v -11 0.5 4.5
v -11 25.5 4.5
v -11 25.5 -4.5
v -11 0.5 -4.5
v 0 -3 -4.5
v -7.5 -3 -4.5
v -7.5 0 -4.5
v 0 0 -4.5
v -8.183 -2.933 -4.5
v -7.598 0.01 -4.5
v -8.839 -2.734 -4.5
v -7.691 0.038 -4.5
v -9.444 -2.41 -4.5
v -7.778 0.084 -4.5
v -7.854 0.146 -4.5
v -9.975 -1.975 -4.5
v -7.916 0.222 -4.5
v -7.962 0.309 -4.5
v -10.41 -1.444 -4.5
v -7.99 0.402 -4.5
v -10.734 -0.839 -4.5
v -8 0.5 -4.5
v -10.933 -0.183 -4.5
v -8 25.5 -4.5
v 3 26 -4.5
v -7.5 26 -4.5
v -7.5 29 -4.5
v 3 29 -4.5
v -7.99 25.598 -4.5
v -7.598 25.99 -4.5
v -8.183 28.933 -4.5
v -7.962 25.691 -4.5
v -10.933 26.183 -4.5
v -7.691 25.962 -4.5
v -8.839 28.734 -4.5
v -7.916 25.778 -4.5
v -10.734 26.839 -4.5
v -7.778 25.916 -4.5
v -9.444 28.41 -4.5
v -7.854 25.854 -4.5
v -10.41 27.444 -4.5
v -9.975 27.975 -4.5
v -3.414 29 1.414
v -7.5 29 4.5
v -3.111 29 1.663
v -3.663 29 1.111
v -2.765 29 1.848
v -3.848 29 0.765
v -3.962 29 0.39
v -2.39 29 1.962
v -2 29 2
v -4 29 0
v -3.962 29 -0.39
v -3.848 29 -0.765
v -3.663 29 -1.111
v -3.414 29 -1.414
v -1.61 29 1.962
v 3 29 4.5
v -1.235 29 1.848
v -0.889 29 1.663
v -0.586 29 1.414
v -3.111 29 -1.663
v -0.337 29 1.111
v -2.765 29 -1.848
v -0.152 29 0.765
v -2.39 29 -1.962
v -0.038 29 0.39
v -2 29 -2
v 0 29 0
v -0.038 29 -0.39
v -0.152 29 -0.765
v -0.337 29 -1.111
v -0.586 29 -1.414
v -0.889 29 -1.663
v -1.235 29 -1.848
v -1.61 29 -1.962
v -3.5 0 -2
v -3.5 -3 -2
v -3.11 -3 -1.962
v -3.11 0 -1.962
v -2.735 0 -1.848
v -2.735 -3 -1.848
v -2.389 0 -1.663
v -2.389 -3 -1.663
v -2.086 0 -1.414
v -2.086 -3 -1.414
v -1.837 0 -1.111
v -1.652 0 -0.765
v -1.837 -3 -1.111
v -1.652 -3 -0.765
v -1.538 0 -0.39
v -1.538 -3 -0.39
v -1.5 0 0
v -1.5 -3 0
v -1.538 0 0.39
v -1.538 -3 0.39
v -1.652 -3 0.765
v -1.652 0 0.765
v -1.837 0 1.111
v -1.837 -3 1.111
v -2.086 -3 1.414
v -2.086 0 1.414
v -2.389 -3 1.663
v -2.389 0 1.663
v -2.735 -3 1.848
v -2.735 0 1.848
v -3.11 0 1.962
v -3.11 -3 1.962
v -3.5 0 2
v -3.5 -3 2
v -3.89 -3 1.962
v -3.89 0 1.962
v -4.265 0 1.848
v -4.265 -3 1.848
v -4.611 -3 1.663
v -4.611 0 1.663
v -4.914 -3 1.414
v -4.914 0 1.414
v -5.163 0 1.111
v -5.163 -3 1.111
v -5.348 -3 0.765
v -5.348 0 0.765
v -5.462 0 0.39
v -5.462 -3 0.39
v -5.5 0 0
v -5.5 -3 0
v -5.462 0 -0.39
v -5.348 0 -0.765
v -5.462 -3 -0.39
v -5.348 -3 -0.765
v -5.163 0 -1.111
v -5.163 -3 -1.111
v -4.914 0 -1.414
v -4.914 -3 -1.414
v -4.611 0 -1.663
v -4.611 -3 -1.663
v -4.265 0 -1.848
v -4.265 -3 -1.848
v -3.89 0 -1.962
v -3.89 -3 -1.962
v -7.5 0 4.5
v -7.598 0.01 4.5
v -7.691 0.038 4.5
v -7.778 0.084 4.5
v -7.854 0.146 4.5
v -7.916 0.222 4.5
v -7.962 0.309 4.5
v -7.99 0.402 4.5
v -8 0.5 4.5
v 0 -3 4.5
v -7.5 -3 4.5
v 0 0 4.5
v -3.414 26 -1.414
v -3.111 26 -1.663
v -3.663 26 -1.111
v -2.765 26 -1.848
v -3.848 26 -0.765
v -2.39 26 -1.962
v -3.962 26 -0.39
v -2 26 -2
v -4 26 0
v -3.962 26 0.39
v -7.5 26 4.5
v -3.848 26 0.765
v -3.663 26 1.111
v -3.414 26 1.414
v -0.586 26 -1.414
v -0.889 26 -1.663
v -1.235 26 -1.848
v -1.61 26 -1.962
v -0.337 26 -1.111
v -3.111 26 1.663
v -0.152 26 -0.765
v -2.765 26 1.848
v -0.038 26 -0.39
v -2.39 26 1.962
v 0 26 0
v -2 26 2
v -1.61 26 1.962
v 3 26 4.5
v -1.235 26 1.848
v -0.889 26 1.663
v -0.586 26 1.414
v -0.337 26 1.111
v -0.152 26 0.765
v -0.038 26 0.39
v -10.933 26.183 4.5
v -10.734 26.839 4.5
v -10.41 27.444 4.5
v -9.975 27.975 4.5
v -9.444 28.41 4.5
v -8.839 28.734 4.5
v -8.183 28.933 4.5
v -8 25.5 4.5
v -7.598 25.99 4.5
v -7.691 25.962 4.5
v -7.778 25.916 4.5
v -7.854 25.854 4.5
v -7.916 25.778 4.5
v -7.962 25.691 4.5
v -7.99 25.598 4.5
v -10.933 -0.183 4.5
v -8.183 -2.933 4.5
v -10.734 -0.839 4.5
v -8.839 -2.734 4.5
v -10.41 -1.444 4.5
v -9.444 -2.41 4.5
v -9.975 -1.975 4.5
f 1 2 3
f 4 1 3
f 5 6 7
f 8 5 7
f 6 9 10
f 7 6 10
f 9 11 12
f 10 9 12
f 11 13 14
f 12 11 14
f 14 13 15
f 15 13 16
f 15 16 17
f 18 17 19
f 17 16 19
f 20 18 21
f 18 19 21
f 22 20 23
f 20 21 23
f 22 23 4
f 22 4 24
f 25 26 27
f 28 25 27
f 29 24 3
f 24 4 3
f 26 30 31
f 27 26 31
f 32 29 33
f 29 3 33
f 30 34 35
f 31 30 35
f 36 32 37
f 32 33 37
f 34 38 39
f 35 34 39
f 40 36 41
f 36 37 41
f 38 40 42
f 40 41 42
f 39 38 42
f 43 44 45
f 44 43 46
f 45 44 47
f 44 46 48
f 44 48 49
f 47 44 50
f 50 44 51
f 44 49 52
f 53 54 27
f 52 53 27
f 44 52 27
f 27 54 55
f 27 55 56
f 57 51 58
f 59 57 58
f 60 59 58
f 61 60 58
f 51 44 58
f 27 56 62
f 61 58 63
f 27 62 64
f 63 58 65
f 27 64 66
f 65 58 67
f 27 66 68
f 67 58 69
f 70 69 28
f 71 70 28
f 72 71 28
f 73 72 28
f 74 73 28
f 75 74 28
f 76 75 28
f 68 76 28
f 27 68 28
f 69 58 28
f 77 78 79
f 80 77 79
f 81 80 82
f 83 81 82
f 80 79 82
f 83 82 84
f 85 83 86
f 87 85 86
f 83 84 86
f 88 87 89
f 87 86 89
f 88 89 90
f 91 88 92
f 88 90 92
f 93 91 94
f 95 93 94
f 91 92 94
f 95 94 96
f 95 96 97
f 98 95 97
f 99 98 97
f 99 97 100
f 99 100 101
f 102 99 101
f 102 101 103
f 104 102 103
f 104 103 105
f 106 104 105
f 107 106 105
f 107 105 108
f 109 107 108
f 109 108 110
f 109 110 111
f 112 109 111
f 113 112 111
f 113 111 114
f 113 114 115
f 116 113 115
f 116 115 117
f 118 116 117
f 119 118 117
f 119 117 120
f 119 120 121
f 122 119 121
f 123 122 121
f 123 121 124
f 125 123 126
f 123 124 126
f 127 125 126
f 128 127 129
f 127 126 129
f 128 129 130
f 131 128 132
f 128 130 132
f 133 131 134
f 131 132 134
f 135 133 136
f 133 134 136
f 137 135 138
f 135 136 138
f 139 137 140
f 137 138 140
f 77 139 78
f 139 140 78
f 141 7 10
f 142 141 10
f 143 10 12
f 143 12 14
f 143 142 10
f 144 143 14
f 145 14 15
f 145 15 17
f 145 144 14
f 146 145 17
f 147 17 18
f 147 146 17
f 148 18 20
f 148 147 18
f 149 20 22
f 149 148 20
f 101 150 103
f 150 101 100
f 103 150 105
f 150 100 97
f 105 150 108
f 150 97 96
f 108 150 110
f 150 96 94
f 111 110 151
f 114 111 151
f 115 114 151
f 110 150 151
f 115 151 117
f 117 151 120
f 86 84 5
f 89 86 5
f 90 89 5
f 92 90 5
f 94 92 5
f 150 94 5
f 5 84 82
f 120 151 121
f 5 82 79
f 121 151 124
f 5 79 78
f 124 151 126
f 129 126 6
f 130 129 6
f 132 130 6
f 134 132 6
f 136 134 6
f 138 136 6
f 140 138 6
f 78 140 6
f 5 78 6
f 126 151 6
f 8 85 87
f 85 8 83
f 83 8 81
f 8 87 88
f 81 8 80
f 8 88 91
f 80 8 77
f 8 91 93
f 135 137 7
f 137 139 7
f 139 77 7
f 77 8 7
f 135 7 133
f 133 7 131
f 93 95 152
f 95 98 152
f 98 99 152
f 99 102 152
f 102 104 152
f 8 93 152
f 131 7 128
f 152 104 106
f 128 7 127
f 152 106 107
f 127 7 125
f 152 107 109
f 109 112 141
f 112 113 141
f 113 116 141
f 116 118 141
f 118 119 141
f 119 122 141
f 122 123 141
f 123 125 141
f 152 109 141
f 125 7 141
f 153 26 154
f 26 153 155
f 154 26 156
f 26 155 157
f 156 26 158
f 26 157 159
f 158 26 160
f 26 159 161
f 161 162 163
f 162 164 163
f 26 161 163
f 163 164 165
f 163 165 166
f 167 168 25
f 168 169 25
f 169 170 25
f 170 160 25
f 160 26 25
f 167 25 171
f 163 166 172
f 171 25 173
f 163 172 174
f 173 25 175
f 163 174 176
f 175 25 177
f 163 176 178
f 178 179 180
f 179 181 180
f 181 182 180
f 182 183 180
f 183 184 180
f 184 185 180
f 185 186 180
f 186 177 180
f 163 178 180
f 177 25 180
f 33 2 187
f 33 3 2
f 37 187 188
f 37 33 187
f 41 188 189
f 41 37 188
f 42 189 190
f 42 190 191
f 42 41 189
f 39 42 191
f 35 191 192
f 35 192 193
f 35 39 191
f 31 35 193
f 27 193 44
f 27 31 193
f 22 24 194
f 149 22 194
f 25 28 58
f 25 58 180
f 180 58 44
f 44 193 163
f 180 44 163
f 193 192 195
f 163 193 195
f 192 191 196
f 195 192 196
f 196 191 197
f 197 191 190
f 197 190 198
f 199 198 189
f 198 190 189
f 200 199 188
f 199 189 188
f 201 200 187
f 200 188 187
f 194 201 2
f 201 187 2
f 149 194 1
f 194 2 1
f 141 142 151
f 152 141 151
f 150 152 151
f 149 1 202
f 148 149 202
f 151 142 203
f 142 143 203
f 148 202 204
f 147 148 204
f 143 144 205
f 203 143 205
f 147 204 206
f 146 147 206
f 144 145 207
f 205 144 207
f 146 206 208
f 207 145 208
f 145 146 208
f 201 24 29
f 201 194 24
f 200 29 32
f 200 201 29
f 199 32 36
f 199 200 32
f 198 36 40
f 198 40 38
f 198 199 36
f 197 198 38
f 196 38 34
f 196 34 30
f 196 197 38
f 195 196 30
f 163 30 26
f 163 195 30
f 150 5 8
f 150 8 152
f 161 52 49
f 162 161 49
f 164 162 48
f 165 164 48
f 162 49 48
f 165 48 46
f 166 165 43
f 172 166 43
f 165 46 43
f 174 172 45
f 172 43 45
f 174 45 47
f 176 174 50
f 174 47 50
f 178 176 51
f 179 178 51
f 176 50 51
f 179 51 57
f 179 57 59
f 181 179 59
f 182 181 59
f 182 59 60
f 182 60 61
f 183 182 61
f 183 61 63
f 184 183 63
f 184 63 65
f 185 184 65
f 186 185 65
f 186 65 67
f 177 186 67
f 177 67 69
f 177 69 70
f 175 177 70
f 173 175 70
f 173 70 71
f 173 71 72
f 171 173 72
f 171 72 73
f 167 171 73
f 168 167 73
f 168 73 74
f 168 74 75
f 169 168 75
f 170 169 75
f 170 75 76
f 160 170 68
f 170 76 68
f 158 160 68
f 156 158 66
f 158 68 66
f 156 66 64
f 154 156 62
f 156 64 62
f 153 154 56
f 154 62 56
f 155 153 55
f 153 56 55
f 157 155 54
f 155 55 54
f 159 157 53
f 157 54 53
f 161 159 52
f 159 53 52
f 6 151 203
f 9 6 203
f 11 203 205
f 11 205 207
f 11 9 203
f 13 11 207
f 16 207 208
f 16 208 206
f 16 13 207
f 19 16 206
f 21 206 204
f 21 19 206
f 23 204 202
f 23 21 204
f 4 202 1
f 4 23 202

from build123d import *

# Parameters (mm, degrees)
SKETCH2_W          = 9
SKETCH2_H          = 3
SKETCH7_R          = 2
CUT_EXTRUDE1_DEPTH = 10
SKETCH8_R          = 2
CUT_EXTRUDE2_DEPTH = 10


with BuildPart() as part:
    # Sweep1: sweep along a path in Sketch1
    with BuildLine(Plane.XY) as sweep1_path:
        Line((0, 0), (-7.5, 0))
        ThreePointArc((-7.5, 0), (-7.853553391, 0.146446609), (-8, 0.5))
        Line((-8, 0.5), (-8, 25.5))
        ThreePointArc((-8, 25.5), (-7.853553391, 25.853553391), (-7.5, 26))
        Line((-7.5, 26), (3, 26))
    # Sketch2 → Sweep1 (sweep)
    with BuildSketch(Plane(origin=(0, 0, 0), x_dir=(0, 0, -1), z_dir=(1, 0, 0))):
        with Locations((0, -1.5)):
            Rectangle(SKETCH2_W, SKETCH2_H)
    sweep(path=sweep1_path.line)

    # Sketch7 → Cut-Extrude1 (cut)
    with BuildSketch(Plane(origin=(0, 29, 0), x_dir=(1, 0, 0), z_dir=(0, 1, 0))):
        with Locations(Location((-2, 0, 0), (0, 0, 180))):
            Circle(SKETCH7_R)
    extrude(amount=-CUT_EXTRUDE1_DEPTH, mode=Mode.SUBTRACT)

    # Sketch8 → Cut-Extrude2 (cut)
    with BuildSketch(Plane(origin=(0, -3, 0), x_dir=(-1, 0, 0), z_dir=(0, -1, 0))):
        with Locations(Location((3.5, 0, 0), (0, 0, 90))):
            Circle(SKETCH8_R)
    extrude(amount=-CUT_EXTRUDE2_DEPTH, mode=Mode.SUBTRACT)


solid = part.part
